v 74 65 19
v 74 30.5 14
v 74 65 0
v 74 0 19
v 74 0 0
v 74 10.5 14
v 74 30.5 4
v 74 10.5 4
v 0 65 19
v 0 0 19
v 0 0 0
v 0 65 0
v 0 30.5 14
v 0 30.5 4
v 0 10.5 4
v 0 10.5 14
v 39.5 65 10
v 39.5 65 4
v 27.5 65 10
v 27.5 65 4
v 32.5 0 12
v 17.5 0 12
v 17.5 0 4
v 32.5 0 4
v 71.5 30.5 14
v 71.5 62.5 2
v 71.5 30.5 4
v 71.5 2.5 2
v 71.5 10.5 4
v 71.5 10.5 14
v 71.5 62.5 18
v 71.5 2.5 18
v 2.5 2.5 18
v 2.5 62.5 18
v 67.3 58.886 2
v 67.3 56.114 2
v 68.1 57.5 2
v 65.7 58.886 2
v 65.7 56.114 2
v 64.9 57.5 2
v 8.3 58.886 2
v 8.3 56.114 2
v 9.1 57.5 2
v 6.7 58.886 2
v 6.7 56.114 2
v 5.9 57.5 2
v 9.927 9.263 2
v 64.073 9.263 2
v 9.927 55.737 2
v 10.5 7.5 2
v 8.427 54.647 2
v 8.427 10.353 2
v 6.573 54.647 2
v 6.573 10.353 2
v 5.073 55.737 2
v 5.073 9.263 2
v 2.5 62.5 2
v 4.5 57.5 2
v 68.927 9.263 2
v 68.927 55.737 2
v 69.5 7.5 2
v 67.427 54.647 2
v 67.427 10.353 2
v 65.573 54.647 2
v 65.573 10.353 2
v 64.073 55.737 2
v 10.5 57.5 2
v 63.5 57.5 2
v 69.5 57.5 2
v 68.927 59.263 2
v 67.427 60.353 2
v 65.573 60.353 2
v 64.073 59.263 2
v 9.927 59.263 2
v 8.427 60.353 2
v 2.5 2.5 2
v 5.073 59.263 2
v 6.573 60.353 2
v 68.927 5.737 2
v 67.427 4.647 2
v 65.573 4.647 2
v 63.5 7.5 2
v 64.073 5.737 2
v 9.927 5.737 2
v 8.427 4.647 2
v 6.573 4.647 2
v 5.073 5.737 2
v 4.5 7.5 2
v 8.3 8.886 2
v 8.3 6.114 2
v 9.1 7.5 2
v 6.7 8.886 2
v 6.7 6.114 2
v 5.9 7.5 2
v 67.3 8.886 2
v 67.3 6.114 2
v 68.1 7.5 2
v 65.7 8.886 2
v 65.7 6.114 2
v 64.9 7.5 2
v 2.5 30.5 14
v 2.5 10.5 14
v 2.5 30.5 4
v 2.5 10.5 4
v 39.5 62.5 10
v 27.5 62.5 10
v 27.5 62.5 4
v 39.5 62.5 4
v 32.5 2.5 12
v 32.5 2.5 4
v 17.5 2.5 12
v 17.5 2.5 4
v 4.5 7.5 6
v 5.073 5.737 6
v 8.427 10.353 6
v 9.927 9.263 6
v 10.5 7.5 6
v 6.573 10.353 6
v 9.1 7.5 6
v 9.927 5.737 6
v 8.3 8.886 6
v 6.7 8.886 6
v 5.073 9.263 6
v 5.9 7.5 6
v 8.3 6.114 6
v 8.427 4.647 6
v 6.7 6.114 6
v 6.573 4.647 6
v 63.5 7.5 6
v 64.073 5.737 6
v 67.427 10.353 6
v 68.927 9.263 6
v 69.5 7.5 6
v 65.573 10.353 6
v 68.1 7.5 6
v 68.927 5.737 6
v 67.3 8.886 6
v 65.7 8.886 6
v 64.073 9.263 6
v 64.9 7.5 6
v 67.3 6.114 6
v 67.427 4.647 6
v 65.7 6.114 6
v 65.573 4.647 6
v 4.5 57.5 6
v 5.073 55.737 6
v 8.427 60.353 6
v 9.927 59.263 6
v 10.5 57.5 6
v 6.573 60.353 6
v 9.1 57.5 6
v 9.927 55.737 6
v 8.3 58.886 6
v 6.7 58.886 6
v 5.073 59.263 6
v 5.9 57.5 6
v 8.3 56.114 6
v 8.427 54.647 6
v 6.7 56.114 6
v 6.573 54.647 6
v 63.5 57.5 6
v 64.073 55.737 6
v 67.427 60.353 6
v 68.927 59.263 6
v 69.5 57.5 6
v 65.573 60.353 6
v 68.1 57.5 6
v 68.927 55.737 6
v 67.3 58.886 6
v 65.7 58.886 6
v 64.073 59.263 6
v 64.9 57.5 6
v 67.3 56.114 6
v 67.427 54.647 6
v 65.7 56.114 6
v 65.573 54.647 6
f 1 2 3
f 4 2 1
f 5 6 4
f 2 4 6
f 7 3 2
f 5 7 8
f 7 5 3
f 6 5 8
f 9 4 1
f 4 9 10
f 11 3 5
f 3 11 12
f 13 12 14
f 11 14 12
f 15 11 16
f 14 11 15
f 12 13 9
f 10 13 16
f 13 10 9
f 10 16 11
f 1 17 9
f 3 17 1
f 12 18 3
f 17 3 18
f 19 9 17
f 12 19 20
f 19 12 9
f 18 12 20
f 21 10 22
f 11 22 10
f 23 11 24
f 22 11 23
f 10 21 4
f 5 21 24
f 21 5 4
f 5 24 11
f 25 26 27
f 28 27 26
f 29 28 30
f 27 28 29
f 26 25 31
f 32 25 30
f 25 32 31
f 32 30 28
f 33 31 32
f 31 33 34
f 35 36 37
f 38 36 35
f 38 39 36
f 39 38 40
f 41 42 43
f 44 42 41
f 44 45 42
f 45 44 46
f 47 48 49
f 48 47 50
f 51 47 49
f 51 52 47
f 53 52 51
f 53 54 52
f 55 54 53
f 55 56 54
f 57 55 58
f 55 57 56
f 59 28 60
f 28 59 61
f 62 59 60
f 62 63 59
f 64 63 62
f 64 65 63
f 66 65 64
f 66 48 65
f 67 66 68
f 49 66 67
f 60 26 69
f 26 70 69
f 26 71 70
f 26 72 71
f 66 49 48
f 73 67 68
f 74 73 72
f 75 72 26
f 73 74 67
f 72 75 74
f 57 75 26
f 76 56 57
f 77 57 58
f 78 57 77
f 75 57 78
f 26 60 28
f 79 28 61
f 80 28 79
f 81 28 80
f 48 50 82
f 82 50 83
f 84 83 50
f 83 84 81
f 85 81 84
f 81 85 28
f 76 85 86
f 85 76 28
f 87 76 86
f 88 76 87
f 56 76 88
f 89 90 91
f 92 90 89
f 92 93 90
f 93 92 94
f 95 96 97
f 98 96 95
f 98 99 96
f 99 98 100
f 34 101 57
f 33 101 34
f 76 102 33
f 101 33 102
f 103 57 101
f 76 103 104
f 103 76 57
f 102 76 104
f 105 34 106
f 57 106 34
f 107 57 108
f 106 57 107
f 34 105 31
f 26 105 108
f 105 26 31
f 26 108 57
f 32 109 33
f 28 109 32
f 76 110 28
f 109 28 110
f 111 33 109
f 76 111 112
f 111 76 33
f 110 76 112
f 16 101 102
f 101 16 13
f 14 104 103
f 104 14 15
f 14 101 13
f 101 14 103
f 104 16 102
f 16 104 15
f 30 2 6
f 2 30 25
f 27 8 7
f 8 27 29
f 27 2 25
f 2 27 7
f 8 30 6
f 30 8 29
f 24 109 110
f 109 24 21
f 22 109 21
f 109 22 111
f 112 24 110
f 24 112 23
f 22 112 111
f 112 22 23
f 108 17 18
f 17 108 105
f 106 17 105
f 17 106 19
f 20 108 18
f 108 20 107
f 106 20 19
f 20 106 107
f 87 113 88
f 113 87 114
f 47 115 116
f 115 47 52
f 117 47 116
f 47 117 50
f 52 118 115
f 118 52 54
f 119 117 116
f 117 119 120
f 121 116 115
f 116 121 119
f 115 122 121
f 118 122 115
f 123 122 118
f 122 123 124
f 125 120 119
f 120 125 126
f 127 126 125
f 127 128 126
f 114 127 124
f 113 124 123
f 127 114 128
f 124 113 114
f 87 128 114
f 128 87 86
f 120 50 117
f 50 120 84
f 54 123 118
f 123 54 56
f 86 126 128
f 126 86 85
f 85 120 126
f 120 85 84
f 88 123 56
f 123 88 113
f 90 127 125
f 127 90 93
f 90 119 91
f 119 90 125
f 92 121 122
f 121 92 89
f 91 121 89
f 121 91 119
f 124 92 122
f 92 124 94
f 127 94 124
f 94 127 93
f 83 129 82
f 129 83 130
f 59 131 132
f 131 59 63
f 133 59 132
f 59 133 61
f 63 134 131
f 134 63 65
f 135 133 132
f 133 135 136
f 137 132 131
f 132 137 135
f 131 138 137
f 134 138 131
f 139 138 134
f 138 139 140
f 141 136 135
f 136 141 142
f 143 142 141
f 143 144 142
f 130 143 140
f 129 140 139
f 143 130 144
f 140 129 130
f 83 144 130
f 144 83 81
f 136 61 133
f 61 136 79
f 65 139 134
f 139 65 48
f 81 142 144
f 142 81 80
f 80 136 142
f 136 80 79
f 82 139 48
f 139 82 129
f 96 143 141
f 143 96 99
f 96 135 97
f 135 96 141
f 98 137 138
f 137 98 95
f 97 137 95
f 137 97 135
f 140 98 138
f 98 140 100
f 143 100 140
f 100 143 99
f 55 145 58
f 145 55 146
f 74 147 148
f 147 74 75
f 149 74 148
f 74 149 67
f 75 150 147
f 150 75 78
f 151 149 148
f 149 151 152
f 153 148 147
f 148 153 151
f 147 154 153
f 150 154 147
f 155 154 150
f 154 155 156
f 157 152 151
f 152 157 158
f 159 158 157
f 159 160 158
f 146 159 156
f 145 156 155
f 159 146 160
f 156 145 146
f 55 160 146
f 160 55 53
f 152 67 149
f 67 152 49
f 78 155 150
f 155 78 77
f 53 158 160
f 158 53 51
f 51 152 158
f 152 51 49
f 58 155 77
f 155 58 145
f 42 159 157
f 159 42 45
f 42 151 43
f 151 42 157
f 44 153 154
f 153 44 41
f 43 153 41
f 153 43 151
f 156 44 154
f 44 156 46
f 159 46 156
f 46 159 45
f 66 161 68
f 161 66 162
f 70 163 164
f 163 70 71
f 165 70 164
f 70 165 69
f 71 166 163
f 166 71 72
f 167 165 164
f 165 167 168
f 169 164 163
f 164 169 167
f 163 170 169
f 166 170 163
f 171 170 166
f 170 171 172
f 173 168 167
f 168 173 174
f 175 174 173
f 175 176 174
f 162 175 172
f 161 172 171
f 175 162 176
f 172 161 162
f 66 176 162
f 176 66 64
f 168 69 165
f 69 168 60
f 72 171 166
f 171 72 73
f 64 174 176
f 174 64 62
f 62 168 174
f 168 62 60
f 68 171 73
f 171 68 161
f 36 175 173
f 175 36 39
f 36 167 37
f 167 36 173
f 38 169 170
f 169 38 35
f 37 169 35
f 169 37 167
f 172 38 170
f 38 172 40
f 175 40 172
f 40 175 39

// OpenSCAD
// Motor Controller Case - Individual Parts for 3D Printing
// Choose which part to generate by uncommenting the desired section

// Common dimensions and modules
board_length = 65;
board_width = 56;
board_thickness = 1.6;

case_wall = 2.5;
case_floor = 2;
case_ceiling = 2;
case_clearance = 3;

capacitor_height = 12;
terminal_height = 8;
chip_height = 4;

internal_length = board_length + 4;
internal_width = board_width + 4;
internal_height = max(capacitor_height, terminal_height) + case_clearance;

external_length = internal_length + (case_wall * 2);
external_width = internal_width + (case_wall * 2);
external_height = internal_height + case_floor + case_ceiling;

post_diameter = 6;
post_height = case_floor + 2;
screw_hole_diameter = 3.2;

terminal_width = 20;
terminal_depth = 12;

module main_case() {
    difference() {
        cube([external_length, external_width, external_height]);
        
        translate([case_wall, case_wall, case_floor]) {
            cube([internal_length, internal_width, internal_height + 1]);
        }
        
        // Terminal block cutouts (left side)
        translate([-1, case_wall + 8, case_floor + 2]) {
            cube([case_wall + 2, terminal_width, terminal_height + 2]);
        }
        
        // Terminal block cutouts (right side)  
        translate([external_length - case_wall - 1, case_wall + 8, case_floor + 2]) {
            cube([case_wall + 2, terminal_width, terminal_height + 2]);
        }
        
        // Power input connector cutout
        translate([case_wall + 15, -1, case_floor + 2]) {
            cube([15, case_wall + 2, 8]);
        }
        
        // Control signal connector cutout
        translate([case_wall + 25, external_width - case_wall - 1, case_floor + 2]) {
            cube([12, case_wall + 2, 6]);
        }
    }
    
    // Mounting posts
    translate([case_wall + 5, case_wall + 5, case_floor]) {
        mounting_post();
    }
    translate([case_wall + internal_length - 5, case_wall + 5, case_floor]) {
        mounting_post();
    }
    translate([case_wall + 5, case_wall + internal_width - 5, case_floor]) {
        mounting_post();
    }
    translate([case_wall + internal_length - 5, case_wall + internal_width - 5, case_floor]) {
        mounting_post();
    }
}

module mounting_post() {
    difference() {
        cylinder(d=post_diameter, h=post_height);
        cylinder(d=screw_hole_diameter, h=post_height + 1);
    }
}

module case_lid() {
    difference() {
        cube([external_length, external_width, case_ceiling + 2]);
        
        translate([case_wall/2, case_wall/2, case_ceiling]) {
            cube([external_length - case_wall, external_width - case_wall, 3]);
        }
        
        // Ventilation holes
        for(x = [15:10:external_length-15]) {
            for(y = [15:10:external_width-15]) {
                translate([x, y, -1]) {
                    cylinder(d=3, h=case_ceiling + 4);
                }
            }
        }
        
        // Label recess
        translate([external_length/2 - 20, external_width/2 - 5, -0.5]) {
            cube([40, 10, 1]);
        }
    }
}

module rubber_foot() {
    difference() {
        cylinder(d=12, h=3);
        translate([0, 0, 1]) {
            cylinder(d=8, h=3);
        }
    }
}

// UNCOMMENT THE PART YOU WANT TO PRINT:

// Part 1: Case Bottom
main_case();

// Part 2: Case Lid (uncomment to print lid)
// case_lid();

// Part 3: Rubber Feet (uncomment to print 4 feet)
// for(i = [0:3]) {
//     translate([i * 15, 0, 0]) {
//         rubber_foot();
//     }
// }
